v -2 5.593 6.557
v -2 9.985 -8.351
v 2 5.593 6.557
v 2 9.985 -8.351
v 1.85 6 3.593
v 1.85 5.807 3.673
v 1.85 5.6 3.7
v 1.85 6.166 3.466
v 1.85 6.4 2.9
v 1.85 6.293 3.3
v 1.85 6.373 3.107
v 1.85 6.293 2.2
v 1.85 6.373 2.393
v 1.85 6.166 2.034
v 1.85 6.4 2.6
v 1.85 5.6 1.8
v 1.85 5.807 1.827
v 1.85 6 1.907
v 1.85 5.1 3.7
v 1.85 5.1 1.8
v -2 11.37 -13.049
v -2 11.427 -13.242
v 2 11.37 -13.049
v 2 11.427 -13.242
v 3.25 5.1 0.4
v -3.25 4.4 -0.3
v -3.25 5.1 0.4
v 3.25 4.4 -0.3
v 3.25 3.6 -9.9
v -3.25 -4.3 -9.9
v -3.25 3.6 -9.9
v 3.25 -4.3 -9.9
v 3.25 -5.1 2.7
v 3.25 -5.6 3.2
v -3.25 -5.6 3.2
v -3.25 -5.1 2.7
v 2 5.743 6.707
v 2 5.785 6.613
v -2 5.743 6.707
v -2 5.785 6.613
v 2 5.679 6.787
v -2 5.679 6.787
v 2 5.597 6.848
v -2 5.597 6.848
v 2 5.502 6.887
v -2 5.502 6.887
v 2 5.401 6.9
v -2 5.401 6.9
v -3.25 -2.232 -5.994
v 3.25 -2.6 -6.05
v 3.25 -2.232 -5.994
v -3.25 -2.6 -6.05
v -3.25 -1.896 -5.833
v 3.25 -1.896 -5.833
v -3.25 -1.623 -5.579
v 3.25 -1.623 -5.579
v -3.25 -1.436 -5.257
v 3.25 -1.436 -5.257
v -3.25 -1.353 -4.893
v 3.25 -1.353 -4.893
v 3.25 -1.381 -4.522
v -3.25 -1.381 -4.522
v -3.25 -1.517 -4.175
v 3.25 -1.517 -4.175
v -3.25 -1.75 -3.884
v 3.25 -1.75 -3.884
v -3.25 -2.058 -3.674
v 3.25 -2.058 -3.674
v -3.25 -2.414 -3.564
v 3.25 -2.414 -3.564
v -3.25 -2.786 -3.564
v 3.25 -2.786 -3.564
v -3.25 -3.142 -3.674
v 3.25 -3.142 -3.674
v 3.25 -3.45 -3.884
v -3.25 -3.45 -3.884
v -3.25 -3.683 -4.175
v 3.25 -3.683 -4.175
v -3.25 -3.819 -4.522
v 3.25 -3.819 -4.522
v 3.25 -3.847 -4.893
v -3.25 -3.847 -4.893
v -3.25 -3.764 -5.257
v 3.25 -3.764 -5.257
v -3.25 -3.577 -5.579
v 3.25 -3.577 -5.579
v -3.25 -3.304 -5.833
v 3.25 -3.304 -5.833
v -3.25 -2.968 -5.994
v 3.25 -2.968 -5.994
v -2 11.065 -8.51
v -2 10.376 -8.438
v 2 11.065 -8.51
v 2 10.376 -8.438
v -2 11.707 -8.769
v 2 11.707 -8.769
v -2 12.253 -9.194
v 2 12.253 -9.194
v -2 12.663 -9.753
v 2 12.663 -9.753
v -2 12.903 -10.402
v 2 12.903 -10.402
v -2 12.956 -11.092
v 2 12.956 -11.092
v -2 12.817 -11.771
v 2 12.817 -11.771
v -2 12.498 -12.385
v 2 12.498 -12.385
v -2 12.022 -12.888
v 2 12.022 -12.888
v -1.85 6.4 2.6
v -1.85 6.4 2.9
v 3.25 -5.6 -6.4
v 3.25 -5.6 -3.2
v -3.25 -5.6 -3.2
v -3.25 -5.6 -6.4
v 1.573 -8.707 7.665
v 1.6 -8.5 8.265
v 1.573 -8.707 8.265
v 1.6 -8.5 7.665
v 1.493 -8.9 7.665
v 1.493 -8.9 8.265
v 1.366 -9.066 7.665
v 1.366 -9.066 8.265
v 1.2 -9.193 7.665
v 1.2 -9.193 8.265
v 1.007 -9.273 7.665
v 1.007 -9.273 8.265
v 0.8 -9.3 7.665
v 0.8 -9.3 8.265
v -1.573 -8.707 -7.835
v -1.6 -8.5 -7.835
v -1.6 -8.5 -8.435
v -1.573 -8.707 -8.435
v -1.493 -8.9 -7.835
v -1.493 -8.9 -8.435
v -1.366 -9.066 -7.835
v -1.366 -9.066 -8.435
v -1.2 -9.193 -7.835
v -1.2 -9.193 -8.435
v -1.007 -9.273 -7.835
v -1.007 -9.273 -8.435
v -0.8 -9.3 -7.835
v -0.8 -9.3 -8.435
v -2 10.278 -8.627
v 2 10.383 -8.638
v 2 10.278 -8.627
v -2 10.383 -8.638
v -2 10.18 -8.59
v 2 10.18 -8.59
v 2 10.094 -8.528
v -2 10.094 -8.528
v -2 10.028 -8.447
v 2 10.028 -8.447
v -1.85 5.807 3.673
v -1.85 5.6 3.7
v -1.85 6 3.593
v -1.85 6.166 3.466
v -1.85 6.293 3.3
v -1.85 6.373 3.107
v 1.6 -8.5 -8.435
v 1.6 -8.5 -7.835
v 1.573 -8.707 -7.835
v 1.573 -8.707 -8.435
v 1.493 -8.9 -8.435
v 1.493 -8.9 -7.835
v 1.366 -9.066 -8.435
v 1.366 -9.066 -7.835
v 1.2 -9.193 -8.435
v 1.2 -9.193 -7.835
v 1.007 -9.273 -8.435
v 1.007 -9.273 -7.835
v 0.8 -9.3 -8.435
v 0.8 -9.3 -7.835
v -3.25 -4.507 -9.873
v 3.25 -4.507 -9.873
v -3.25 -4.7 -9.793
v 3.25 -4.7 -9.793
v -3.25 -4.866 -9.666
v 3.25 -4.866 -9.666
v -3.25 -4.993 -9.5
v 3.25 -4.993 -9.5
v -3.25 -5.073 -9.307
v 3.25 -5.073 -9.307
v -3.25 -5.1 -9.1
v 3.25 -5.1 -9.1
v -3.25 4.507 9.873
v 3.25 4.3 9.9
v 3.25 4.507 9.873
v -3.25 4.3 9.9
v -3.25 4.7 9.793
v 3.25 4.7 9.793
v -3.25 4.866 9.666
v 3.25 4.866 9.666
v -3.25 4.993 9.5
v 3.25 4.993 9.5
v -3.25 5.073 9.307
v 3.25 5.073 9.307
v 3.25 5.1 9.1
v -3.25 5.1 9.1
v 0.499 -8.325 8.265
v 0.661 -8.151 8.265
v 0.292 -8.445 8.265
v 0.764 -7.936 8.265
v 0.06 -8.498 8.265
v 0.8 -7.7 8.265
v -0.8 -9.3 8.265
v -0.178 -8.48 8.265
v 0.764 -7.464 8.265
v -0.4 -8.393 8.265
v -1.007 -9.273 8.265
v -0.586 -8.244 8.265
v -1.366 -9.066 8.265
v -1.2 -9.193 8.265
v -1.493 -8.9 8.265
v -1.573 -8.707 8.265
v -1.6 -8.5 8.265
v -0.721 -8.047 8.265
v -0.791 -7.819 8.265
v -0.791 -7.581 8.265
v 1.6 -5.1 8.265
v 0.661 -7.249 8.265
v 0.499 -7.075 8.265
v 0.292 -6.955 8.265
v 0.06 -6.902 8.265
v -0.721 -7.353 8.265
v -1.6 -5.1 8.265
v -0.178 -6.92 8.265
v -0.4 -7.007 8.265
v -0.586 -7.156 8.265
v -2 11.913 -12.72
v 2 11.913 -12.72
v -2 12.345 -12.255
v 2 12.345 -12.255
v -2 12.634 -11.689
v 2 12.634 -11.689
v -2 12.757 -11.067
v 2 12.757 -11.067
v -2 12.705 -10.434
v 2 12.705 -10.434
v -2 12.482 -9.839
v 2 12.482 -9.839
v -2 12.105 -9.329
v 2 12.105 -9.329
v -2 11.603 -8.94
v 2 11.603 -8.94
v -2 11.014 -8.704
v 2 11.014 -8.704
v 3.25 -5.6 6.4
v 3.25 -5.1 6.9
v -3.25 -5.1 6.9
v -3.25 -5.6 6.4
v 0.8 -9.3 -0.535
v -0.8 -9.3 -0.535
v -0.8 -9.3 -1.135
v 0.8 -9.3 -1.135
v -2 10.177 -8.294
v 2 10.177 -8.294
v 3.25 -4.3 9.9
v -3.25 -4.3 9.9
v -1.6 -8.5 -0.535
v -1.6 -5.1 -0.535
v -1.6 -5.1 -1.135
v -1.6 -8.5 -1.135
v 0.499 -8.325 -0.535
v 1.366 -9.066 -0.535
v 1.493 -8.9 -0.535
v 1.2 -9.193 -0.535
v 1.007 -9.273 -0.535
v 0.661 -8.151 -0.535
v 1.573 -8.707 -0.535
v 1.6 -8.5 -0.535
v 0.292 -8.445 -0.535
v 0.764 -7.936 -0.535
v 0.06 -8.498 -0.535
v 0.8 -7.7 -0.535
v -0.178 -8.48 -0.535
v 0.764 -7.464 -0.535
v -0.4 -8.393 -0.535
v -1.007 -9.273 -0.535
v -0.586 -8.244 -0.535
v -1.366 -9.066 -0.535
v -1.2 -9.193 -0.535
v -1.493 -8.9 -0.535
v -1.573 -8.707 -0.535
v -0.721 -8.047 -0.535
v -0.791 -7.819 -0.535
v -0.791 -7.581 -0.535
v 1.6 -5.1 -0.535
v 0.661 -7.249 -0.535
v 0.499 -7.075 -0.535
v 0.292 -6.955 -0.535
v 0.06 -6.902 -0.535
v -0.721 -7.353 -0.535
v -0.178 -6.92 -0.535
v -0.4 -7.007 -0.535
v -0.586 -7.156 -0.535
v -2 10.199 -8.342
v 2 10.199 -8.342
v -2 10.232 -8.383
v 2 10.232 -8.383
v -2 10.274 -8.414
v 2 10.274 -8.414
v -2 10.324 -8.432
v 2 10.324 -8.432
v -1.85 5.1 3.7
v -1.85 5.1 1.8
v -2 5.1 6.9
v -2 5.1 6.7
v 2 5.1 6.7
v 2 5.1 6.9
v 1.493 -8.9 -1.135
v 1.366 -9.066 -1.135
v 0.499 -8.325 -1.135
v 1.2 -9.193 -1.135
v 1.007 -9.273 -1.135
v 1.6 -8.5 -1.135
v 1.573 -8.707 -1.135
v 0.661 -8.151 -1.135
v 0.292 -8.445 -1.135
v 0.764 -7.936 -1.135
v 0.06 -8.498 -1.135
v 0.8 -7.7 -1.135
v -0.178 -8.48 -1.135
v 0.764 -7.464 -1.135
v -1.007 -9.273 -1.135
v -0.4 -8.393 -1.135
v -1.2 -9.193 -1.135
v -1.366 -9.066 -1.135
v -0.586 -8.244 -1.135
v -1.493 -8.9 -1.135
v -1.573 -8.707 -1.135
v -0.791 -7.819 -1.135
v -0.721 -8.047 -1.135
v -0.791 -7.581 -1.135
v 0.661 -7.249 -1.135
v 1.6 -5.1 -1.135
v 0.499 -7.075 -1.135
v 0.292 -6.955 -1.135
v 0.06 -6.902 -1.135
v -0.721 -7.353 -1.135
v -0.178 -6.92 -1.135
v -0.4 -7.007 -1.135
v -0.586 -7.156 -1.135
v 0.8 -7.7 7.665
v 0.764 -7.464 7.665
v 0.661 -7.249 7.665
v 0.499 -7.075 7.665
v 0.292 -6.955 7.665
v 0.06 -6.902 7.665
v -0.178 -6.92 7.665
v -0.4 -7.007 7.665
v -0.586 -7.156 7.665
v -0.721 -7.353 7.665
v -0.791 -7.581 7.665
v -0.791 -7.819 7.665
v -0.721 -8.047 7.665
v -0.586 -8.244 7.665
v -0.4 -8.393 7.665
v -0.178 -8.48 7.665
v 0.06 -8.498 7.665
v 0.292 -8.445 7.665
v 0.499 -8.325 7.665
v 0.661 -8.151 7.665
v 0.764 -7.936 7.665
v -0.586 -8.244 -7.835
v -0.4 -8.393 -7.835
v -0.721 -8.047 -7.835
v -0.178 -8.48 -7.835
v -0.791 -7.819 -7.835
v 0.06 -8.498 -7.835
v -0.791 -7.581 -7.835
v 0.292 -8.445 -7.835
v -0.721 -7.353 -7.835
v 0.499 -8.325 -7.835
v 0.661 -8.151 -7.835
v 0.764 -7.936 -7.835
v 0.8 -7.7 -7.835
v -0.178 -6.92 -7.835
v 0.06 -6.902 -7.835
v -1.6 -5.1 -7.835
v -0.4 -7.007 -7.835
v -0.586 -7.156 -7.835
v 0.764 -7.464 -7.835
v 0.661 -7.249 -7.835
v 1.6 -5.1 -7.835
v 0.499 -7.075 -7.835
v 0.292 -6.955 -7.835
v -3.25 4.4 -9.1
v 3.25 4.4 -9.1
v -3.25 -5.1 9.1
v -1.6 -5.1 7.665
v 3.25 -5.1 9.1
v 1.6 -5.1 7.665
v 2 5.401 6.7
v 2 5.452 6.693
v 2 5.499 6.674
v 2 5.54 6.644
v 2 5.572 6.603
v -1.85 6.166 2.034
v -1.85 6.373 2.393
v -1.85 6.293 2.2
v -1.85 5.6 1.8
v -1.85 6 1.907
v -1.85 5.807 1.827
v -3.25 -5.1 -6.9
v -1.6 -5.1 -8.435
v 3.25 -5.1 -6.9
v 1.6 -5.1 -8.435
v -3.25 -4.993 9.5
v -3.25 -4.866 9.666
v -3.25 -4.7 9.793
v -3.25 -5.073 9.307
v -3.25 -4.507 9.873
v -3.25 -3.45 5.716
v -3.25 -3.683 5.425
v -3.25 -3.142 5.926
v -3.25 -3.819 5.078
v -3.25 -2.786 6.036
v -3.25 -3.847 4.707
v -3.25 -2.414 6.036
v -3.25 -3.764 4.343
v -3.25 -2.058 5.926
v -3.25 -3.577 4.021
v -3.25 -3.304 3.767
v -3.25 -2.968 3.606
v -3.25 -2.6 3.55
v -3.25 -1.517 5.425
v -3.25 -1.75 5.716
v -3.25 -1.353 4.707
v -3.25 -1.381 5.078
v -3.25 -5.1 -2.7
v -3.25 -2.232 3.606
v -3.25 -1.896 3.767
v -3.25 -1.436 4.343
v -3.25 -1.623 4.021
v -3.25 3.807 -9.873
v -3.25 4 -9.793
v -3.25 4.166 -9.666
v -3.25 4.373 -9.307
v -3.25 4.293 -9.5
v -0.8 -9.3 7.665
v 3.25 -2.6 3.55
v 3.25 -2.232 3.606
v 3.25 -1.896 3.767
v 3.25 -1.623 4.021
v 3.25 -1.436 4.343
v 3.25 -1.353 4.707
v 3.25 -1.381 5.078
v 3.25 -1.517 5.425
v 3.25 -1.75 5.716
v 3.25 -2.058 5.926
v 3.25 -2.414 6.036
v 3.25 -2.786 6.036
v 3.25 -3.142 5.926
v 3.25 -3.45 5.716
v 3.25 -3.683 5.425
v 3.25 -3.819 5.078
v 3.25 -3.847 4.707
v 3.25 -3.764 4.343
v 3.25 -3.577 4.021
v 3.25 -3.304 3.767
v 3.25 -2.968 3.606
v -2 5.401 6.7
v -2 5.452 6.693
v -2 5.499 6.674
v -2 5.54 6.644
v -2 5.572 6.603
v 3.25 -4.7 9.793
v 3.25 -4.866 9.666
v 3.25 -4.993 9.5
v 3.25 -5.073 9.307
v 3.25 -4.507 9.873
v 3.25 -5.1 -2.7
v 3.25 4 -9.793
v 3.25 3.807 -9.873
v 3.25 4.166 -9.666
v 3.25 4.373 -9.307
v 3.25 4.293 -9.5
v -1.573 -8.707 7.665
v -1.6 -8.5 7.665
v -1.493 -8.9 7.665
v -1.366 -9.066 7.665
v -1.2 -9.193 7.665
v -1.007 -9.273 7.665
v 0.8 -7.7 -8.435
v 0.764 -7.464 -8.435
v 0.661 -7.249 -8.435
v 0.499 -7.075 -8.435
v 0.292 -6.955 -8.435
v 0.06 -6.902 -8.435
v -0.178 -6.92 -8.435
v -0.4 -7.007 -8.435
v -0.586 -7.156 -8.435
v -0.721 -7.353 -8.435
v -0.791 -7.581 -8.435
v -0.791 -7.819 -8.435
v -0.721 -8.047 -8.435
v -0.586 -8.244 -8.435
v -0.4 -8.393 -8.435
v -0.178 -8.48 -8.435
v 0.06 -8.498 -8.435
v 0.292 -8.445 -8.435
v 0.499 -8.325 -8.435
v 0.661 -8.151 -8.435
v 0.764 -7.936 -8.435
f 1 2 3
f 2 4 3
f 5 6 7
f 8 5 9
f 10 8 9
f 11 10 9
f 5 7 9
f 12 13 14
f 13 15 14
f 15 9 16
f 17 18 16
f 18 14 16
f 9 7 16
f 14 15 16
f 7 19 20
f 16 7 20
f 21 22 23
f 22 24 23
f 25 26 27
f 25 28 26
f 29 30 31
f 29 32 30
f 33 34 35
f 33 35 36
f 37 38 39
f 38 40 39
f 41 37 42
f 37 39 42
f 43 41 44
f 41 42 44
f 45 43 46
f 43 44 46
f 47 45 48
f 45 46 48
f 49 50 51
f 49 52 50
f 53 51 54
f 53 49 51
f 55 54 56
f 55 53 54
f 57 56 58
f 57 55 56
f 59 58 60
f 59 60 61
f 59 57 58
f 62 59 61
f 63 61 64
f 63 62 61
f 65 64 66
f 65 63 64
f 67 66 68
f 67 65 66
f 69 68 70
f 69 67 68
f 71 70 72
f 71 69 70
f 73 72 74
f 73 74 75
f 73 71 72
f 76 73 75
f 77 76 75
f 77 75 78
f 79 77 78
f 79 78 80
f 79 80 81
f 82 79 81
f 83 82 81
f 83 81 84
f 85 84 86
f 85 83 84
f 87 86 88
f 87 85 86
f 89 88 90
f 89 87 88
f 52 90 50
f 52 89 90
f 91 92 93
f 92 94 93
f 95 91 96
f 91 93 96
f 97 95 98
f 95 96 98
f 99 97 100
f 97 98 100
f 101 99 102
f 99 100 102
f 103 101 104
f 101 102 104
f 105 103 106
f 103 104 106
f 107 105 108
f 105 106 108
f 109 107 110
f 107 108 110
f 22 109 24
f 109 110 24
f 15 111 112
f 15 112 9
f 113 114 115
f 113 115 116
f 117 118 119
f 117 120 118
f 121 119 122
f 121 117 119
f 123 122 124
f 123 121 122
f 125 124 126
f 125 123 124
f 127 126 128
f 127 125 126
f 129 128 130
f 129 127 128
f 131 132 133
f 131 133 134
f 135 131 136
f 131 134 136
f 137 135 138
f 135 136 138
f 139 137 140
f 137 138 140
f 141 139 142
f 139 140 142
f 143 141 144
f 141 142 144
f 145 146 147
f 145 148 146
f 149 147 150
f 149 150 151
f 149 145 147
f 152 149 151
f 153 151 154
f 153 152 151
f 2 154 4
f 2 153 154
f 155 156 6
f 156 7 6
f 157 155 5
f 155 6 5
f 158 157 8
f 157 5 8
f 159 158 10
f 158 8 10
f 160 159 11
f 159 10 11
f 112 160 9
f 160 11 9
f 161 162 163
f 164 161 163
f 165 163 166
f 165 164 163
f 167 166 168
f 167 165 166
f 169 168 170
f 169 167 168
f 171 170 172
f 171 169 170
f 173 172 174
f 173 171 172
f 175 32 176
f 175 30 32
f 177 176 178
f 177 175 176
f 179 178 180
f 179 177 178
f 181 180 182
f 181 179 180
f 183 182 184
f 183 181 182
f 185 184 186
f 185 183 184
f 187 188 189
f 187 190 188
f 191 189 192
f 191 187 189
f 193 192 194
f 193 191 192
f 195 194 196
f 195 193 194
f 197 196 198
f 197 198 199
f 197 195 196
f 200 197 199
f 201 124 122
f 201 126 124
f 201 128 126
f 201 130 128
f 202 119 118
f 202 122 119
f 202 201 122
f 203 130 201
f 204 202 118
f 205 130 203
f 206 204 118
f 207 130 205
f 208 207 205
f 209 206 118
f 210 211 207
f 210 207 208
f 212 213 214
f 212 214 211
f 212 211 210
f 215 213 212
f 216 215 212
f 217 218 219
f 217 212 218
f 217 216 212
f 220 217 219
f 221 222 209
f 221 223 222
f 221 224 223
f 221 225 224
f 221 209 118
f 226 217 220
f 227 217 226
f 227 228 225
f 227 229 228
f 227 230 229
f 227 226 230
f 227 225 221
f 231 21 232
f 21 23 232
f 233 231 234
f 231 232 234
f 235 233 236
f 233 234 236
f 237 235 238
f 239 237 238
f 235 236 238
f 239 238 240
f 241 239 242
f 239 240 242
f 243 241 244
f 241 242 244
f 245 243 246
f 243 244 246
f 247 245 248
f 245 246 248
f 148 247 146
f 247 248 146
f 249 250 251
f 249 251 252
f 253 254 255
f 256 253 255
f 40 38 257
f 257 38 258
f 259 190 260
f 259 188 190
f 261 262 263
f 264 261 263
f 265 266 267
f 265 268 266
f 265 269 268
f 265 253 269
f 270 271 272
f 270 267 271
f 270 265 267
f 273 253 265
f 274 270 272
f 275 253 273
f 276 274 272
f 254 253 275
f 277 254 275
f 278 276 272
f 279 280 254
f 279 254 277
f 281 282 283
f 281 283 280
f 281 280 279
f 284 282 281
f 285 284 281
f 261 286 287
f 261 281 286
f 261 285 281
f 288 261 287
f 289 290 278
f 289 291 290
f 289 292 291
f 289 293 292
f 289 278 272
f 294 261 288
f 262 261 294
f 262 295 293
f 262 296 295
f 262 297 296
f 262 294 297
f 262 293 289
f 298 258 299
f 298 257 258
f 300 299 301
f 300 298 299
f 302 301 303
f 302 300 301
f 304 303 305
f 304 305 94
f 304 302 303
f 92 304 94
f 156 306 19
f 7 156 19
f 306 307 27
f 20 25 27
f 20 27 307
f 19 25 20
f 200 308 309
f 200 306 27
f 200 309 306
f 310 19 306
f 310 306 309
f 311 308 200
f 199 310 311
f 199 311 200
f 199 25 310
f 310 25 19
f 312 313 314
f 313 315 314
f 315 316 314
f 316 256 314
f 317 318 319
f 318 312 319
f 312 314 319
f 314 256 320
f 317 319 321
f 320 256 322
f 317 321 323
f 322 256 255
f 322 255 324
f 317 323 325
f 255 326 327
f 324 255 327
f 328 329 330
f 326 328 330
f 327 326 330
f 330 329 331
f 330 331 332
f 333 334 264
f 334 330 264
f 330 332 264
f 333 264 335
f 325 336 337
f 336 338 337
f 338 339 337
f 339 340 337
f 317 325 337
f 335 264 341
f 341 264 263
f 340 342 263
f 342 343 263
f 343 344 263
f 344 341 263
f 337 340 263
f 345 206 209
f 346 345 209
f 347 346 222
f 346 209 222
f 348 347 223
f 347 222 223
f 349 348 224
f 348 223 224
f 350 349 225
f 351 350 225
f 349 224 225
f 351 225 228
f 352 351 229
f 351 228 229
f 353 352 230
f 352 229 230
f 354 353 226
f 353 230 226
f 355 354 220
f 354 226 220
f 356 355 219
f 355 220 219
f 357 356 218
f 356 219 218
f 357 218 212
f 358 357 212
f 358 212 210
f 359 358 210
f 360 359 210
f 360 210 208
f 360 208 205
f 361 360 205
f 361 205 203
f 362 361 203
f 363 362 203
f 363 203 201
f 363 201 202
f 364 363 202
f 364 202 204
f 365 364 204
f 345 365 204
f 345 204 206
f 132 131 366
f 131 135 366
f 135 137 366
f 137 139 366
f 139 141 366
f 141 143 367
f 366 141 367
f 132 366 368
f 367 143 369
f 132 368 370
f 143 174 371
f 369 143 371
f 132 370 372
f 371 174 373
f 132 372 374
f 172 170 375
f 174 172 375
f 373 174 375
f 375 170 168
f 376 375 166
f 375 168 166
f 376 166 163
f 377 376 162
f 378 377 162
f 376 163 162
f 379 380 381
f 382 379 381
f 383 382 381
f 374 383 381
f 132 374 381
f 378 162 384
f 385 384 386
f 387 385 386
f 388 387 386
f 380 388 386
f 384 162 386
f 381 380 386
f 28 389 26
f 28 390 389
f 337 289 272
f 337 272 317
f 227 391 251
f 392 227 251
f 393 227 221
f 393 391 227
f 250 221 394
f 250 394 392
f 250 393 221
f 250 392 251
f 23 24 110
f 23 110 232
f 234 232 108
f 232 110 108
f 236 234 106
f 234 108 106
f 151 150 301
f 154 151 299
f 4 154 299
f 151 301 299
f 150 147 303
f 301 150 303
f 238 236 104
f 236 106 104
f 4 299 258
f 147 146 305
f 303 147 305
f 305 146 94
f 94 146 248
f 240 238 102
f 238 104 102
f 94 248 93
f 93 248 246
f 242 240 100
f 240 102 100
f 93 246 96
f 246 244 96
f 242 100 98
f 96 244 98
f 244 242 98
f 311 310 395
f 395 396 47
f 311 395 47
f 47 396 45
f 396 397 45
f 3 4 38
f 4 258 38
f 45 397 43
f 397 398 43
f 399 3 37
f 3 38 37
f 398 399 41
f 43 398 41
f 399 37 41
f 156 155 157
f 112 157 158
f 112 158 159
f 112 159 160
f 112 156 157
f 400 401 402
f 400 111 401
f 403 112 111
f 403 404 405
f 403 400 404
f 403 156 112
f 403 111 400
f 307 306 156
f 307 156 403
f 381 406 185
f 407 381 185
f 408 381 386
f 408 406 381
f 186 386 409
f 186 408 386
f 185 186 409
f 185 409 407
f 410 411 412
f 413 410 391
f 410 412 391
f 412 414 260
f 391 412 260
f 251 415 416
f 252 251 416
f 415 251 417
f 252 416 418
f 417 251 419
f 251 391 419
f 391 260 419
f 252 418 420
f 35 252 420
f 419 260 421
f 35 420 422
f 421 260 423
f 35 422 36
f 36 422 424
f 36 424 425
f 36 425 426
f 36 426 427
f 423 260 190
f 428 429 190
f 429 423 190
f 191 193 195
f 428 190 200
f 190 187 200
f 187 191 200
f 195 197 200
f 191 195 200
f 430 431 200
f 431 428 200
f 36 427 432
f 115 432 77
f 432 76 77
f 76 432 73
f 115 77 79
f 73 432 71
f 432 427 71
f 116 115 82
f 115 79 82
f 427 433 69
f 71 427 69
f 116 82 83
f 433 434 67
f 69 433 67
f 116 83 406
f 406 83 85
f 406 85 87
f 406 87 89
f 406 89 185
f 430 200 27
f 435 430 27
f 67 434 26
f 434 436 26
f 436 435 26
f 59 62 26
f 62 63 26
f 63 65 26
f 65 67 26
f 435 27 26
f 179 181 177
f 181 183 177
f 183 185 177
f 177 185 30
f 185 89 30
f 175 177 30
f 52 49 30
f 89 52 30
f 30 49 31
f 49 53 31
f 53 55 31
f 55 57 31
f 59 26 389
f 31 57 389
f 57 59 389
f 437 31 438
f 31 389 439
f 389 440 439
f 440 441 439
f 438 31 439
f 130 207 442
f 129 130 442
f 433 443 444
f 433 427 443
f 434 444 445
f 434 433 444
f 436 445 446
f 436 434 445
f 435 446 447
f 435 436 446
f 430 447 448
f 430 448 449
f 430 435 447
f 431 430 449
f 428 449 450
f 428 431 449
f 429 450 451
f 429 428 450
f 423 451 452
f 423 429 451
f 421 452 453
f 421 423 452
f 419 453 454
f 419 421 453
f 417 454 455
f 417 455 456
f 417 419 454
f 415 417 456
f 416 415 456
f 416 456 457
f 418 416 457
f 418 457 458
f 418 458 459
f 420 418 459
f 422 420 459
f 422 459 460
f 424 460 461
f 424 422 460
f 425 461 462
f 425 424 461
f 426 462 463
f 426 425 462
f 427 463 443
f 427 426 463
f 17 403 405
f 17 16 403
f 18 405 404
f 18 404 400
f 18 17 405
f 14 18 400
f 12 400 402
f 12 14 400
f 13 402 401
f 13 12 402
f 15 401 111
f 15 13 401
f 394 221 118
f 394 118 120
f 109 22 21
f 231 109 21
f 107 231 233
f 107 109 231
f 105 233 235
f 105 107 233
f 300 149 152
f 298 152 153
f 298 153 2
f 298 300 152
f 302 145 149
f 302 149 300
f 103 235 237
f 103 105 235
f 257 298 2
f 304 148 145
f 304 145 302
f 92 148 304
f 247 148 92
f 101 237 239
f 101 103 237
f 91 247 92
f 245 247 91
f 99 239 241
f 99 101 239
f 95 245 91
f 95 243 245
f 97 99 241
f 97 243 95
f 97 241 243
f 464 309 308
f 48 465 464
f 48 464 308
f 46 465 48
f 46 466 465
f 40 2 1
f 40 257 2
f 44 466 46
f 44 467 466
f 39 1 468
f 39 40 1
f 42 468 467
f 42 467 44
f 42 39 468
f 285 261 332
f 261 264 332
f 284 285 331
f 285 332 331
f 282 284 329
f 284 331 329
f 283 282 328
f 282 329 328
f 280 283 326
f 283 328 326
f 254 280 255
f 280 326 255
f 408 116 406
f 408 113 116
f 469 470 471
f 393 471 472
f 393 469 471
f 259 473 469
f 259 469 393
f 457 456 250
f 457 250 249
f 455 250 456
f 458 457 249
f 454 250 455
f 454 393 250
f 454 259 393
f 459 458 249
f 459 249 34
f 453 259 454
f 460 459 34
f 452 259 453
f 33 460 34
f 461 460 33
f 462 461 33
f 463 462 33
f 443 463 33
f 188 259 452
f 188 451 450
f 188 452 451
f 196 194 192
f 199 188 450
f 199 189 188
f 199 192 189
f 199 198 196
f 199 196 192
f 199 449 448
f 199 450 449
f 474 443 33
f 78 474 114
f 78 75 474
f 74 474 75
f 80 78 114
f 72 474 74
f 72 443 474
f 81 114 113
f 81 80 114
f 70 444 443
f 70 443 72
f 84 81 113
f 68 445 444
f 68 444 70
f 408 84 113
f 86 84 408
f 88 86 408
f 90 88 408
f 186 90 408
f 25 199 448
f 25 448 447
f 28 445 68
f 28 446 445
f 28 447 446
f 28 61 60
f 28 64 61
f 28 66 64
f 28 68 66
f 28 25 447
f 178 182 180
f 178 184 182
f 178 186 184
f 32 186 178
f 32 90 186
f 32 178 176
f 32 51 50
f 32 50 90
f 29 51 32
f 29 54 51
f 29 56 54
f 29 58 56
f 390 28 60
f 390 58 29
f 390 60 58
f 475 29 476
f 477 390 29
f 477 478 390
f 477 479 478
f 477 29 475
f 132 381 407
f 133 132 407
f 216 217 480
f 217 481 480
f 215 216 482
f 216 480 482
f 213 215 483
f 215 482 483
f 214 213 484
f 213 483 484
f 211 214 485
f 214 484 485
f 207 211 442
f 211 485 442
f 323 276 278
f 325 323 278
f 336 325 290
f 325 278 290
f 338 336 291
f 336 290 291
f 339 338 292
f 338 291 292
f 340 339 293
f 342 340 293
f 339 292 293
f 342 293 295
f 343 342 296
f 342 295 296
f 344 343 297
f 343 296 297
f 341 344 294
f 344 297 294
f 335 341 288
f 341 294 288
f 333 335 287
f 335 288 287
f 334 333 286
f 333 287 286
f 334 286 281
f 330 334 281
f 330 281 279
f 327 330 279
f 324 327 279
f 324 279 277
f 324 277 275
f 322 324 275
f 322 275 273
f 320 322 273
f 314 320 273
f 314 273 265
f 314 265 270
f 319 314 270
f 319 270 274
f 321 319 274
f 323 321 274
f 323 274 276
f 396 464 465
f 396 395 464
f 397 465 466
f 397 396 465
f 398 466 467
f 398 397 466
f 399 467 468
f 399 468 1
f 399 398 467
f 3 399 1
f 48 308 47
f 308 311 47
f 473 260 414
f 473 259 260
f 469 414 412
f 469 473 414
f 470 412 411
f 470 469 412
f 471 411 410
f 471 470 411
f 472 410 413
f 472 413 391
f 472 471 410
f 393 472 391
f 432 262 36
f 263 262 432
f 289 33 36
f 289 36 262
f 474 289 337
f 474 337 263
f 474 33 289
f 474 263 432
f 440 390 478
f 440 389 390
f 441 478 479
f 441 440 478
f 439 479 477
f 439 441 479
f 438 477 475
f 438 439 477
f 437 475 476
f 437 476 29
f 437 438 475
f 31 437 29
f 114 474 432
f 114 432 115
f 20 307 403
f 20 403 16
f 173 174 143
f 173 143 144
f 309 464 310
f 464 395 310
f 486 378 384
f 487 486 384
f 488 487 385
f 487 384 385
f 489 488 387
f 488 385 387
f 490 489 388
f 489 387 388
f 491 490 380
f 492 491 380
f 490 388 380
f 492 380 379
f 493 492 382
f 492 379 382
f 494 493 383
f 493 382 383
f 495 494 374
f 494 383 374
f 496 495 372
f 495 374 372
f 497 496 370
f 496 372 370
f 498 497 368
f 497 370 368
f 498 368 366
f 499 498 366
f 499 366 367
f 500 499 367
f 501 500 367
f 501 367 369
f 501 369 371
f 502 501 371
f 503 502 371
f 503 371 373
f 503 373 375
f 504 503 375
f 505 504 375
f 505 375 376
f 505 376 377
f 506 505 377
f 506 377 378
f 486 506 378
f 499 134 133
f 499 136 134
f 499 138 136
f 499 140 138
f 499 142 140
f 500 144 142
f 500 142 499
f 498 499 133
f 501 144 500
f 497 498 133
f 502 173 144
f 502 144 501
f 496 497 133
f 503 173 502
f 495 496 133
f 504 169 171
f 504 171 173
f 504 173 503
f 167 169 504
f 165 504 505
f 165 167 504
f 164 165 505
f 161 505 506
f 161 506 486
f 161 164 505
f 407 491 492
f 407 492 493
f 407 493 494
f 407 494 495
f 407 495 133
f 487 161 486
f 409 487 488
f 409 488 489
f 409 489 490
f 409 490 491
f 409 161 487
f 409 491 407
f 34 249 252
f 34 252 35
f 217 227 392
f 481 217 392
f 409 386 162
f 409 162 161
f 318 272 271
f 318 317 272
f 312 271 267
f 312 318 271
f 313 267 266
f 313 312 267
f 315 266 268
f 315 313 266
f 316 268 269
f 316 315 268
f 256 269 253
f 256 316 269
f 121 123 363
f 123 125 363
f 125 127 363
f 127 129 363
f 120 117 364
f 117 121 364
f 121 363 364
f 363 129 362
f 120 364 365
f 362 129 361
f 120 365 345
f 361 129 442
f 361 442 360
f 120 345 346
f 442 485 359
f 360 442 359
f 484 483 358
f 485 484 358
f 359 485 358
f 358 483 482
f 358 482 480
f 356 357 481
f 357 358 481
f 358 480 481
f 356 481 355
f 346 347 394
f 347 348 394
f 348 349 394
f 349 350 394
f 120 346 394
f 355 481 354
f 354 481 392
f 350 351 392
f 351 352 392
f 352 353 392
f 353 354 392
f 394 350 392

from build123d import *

# Parameters (mm, degrees)
SKETCH_1_R          = 1.25
EXTRUDE_1_DEPTH     = 3.25
SKETCH_4_W          = 0.6
SKETCH_4_H          = 4.2
EXTRUDE_4_DEPTH     = 1.6
FILLET_1_R          = 0.8
SKETCH_2_W          = 3.7
SKETCH_2_H          = 1.9
EXTRUDE_2_DEPTH     = 1.3
FILLET_2_R          = 0.8
EXTRUDE_3_DEPTH     = 2
FILLET_4_R          = 0.2
FILLET_3_R          = 0.4
SKETCH_5_R          = 0.8
CUT_EXTRUDE_1_DEPTH = 16.7


with BuildPart() as part:
    # Эскиз1 → Бобышка-Вытянуть1 (new body, symmetric)
    with BuildSketch(Plane(origin=(0, 0, 0), x_dir=(0, 0, -1), z_dir=(1, 0, 0))):
        Polygon((-9.9, 5.1), (-9.9, -5.1), (-6.9, -5.1), (-6.4, -5.6), (-3.2, -5.6), (-2.7, -5.1), (2.7, -5.1), (3.2, -5.6), (6.4, -5.6), (6.9, -5.1), (9.9, -5.1), (9.9, 4.4), (0.3, 4.4), (-0.4, 5.1), align=None)
        with Locations((-4.8, -2.6)):
            Circle(SKETCH_1_R, mode=Mode.SUBTRACT)
        with Locations((4.8, -2.6)):
            Circle(SKETCH_1_R, mode=Mode.SUBTRACT)
    extrude(amount=EXTRUDE_1_DEPTH, both=True)

    # Эскиз4 → Бобышка-Вытянуть4 (add, symmetric)
    with BuildSketch(Plane(origin=(0, 0, 0), x_dir=(0, 0, -1), z_dir=(1, 0, 0))):
        with Locations((0.834899724, -7.2)):
            Rectangle(SKETCH_4_W, SKETCH_4_H)
        with Locations((-7.965100276, -7.2)):
            Rectangle(SKETCH_4_W, SKETCH_4_H)
        with Locations((8.134899724, -7.2)):
            Rectangle(SKETCH_4_W, SKETCH_4_H)
    extrude(amount=EXTRUDE_4_DEPTH, both=True)

    # Скругление1
    fillet_1_edges = [part.edges().sort_by_distance(p)[0] for p in [
        (0, -5.1, 9.9),
        (0, 5.1, 9.9),
        (0, 4.4, -9.9),
        (0, -5.1, -9.9),
        (-1.6, -9.3, 7.965100276),
        (1.6, -9.3, 7.965100276),
        (-1.6, -9.3, -0.834899724),
        (1.6, -9.3, -0.834899724),
        (-1.6, -9.3, -8.134899724),
        (1.6, -9.3, -8.134899724),
    ]]
    fillet(fillet_1_edges, radius=FILLET_1_R)

    # Эскиз2 → Бобышка-Вытянуть2 (add)
    with BuildSketch(Plane(origin=(0, 5.1, 0), x_dir=(1, 0, 0), z_dir=(0, 1, 0))):
        with Locations((0, -2.75)):
            Rectangle(SKETCH_2_W, SKETCH_2_H)
    extrude(amount=EXTRUDE_2_DEPTH)

    # Скругление2
    fillet_2_edges = [part.edges().sort_by_distance(p)[0] for p in [
        (0, 6.4, 1.8),
        (0, 6.4, 3.7),
    ]]
    fillet(fillet_2_edges, radius=FILLET_2_R)

    # Эскиз3 → Бобышка-Вытянуть3 (add, symmetric)
    with BuildSketch(Plane(origin=(0, 0, 0), x_dir=(0, 0, -1), z_dir=(1, 0, 0))):
        with BuildLine():
            Line((-6.9, 5.1), (-6.9, 5.7))
            Line((-6.9, 5.7), (8.447548782, 10.22247127))
            ThreePointArc((8.447548782, 10.22247127), (10.327160868, 12.885134856), (13.241910115, 11.426726206))
            Line((13.241910115, 11.426726206), (13.048790165, 11.369819437))
            ThreePointArc((13.048790165, 11.369819437), (10.286090587, 12.666664311), (8.668057439, 10.078946335))
            Line((8.668057439, 10.078946335), (-6.7, 5.550431767))
            Line((-6.7, 5.550431767), (-6.7, 5.1))
            Line((-6.7, 5.1), (-6.9, 5.1))
        make_face()
    extrude(amount=EXTRUDE_3_DEPTH, both=True)

    # Скругление4
    fillet_4_edges = [part.edges().sort_by_distance(p)[0] for p in [
        (0, 5.550431767, 6.7),
        (0, 10.22247127, -8.447548782),
    ]]
    fillet(fillet_4_edges, radius=FILLET_4_R)

    # Скругление3
    fillet_3_edges = [part.edges().sort_by_distance(p)[0] for p in [
        (0, 10.078946335, -8.668057439),
        (0, 5.7, 6.9),
    ]]
    fillet(fillet_3_edges, radius=FILLET_3_R)

    # Эскиз5 → Вырез-Вытянуть1 (cut)
    with BuildSketch(Plane.XY.offset(8.265100276)):
        with Locations((0, -7.7)):
            Circle(SKETCH_5_R)
    extrude(amount=-CUT_EXTRUDE_1_DEPTH, mode=Mode.SUBTRACT)


solid = part.part
